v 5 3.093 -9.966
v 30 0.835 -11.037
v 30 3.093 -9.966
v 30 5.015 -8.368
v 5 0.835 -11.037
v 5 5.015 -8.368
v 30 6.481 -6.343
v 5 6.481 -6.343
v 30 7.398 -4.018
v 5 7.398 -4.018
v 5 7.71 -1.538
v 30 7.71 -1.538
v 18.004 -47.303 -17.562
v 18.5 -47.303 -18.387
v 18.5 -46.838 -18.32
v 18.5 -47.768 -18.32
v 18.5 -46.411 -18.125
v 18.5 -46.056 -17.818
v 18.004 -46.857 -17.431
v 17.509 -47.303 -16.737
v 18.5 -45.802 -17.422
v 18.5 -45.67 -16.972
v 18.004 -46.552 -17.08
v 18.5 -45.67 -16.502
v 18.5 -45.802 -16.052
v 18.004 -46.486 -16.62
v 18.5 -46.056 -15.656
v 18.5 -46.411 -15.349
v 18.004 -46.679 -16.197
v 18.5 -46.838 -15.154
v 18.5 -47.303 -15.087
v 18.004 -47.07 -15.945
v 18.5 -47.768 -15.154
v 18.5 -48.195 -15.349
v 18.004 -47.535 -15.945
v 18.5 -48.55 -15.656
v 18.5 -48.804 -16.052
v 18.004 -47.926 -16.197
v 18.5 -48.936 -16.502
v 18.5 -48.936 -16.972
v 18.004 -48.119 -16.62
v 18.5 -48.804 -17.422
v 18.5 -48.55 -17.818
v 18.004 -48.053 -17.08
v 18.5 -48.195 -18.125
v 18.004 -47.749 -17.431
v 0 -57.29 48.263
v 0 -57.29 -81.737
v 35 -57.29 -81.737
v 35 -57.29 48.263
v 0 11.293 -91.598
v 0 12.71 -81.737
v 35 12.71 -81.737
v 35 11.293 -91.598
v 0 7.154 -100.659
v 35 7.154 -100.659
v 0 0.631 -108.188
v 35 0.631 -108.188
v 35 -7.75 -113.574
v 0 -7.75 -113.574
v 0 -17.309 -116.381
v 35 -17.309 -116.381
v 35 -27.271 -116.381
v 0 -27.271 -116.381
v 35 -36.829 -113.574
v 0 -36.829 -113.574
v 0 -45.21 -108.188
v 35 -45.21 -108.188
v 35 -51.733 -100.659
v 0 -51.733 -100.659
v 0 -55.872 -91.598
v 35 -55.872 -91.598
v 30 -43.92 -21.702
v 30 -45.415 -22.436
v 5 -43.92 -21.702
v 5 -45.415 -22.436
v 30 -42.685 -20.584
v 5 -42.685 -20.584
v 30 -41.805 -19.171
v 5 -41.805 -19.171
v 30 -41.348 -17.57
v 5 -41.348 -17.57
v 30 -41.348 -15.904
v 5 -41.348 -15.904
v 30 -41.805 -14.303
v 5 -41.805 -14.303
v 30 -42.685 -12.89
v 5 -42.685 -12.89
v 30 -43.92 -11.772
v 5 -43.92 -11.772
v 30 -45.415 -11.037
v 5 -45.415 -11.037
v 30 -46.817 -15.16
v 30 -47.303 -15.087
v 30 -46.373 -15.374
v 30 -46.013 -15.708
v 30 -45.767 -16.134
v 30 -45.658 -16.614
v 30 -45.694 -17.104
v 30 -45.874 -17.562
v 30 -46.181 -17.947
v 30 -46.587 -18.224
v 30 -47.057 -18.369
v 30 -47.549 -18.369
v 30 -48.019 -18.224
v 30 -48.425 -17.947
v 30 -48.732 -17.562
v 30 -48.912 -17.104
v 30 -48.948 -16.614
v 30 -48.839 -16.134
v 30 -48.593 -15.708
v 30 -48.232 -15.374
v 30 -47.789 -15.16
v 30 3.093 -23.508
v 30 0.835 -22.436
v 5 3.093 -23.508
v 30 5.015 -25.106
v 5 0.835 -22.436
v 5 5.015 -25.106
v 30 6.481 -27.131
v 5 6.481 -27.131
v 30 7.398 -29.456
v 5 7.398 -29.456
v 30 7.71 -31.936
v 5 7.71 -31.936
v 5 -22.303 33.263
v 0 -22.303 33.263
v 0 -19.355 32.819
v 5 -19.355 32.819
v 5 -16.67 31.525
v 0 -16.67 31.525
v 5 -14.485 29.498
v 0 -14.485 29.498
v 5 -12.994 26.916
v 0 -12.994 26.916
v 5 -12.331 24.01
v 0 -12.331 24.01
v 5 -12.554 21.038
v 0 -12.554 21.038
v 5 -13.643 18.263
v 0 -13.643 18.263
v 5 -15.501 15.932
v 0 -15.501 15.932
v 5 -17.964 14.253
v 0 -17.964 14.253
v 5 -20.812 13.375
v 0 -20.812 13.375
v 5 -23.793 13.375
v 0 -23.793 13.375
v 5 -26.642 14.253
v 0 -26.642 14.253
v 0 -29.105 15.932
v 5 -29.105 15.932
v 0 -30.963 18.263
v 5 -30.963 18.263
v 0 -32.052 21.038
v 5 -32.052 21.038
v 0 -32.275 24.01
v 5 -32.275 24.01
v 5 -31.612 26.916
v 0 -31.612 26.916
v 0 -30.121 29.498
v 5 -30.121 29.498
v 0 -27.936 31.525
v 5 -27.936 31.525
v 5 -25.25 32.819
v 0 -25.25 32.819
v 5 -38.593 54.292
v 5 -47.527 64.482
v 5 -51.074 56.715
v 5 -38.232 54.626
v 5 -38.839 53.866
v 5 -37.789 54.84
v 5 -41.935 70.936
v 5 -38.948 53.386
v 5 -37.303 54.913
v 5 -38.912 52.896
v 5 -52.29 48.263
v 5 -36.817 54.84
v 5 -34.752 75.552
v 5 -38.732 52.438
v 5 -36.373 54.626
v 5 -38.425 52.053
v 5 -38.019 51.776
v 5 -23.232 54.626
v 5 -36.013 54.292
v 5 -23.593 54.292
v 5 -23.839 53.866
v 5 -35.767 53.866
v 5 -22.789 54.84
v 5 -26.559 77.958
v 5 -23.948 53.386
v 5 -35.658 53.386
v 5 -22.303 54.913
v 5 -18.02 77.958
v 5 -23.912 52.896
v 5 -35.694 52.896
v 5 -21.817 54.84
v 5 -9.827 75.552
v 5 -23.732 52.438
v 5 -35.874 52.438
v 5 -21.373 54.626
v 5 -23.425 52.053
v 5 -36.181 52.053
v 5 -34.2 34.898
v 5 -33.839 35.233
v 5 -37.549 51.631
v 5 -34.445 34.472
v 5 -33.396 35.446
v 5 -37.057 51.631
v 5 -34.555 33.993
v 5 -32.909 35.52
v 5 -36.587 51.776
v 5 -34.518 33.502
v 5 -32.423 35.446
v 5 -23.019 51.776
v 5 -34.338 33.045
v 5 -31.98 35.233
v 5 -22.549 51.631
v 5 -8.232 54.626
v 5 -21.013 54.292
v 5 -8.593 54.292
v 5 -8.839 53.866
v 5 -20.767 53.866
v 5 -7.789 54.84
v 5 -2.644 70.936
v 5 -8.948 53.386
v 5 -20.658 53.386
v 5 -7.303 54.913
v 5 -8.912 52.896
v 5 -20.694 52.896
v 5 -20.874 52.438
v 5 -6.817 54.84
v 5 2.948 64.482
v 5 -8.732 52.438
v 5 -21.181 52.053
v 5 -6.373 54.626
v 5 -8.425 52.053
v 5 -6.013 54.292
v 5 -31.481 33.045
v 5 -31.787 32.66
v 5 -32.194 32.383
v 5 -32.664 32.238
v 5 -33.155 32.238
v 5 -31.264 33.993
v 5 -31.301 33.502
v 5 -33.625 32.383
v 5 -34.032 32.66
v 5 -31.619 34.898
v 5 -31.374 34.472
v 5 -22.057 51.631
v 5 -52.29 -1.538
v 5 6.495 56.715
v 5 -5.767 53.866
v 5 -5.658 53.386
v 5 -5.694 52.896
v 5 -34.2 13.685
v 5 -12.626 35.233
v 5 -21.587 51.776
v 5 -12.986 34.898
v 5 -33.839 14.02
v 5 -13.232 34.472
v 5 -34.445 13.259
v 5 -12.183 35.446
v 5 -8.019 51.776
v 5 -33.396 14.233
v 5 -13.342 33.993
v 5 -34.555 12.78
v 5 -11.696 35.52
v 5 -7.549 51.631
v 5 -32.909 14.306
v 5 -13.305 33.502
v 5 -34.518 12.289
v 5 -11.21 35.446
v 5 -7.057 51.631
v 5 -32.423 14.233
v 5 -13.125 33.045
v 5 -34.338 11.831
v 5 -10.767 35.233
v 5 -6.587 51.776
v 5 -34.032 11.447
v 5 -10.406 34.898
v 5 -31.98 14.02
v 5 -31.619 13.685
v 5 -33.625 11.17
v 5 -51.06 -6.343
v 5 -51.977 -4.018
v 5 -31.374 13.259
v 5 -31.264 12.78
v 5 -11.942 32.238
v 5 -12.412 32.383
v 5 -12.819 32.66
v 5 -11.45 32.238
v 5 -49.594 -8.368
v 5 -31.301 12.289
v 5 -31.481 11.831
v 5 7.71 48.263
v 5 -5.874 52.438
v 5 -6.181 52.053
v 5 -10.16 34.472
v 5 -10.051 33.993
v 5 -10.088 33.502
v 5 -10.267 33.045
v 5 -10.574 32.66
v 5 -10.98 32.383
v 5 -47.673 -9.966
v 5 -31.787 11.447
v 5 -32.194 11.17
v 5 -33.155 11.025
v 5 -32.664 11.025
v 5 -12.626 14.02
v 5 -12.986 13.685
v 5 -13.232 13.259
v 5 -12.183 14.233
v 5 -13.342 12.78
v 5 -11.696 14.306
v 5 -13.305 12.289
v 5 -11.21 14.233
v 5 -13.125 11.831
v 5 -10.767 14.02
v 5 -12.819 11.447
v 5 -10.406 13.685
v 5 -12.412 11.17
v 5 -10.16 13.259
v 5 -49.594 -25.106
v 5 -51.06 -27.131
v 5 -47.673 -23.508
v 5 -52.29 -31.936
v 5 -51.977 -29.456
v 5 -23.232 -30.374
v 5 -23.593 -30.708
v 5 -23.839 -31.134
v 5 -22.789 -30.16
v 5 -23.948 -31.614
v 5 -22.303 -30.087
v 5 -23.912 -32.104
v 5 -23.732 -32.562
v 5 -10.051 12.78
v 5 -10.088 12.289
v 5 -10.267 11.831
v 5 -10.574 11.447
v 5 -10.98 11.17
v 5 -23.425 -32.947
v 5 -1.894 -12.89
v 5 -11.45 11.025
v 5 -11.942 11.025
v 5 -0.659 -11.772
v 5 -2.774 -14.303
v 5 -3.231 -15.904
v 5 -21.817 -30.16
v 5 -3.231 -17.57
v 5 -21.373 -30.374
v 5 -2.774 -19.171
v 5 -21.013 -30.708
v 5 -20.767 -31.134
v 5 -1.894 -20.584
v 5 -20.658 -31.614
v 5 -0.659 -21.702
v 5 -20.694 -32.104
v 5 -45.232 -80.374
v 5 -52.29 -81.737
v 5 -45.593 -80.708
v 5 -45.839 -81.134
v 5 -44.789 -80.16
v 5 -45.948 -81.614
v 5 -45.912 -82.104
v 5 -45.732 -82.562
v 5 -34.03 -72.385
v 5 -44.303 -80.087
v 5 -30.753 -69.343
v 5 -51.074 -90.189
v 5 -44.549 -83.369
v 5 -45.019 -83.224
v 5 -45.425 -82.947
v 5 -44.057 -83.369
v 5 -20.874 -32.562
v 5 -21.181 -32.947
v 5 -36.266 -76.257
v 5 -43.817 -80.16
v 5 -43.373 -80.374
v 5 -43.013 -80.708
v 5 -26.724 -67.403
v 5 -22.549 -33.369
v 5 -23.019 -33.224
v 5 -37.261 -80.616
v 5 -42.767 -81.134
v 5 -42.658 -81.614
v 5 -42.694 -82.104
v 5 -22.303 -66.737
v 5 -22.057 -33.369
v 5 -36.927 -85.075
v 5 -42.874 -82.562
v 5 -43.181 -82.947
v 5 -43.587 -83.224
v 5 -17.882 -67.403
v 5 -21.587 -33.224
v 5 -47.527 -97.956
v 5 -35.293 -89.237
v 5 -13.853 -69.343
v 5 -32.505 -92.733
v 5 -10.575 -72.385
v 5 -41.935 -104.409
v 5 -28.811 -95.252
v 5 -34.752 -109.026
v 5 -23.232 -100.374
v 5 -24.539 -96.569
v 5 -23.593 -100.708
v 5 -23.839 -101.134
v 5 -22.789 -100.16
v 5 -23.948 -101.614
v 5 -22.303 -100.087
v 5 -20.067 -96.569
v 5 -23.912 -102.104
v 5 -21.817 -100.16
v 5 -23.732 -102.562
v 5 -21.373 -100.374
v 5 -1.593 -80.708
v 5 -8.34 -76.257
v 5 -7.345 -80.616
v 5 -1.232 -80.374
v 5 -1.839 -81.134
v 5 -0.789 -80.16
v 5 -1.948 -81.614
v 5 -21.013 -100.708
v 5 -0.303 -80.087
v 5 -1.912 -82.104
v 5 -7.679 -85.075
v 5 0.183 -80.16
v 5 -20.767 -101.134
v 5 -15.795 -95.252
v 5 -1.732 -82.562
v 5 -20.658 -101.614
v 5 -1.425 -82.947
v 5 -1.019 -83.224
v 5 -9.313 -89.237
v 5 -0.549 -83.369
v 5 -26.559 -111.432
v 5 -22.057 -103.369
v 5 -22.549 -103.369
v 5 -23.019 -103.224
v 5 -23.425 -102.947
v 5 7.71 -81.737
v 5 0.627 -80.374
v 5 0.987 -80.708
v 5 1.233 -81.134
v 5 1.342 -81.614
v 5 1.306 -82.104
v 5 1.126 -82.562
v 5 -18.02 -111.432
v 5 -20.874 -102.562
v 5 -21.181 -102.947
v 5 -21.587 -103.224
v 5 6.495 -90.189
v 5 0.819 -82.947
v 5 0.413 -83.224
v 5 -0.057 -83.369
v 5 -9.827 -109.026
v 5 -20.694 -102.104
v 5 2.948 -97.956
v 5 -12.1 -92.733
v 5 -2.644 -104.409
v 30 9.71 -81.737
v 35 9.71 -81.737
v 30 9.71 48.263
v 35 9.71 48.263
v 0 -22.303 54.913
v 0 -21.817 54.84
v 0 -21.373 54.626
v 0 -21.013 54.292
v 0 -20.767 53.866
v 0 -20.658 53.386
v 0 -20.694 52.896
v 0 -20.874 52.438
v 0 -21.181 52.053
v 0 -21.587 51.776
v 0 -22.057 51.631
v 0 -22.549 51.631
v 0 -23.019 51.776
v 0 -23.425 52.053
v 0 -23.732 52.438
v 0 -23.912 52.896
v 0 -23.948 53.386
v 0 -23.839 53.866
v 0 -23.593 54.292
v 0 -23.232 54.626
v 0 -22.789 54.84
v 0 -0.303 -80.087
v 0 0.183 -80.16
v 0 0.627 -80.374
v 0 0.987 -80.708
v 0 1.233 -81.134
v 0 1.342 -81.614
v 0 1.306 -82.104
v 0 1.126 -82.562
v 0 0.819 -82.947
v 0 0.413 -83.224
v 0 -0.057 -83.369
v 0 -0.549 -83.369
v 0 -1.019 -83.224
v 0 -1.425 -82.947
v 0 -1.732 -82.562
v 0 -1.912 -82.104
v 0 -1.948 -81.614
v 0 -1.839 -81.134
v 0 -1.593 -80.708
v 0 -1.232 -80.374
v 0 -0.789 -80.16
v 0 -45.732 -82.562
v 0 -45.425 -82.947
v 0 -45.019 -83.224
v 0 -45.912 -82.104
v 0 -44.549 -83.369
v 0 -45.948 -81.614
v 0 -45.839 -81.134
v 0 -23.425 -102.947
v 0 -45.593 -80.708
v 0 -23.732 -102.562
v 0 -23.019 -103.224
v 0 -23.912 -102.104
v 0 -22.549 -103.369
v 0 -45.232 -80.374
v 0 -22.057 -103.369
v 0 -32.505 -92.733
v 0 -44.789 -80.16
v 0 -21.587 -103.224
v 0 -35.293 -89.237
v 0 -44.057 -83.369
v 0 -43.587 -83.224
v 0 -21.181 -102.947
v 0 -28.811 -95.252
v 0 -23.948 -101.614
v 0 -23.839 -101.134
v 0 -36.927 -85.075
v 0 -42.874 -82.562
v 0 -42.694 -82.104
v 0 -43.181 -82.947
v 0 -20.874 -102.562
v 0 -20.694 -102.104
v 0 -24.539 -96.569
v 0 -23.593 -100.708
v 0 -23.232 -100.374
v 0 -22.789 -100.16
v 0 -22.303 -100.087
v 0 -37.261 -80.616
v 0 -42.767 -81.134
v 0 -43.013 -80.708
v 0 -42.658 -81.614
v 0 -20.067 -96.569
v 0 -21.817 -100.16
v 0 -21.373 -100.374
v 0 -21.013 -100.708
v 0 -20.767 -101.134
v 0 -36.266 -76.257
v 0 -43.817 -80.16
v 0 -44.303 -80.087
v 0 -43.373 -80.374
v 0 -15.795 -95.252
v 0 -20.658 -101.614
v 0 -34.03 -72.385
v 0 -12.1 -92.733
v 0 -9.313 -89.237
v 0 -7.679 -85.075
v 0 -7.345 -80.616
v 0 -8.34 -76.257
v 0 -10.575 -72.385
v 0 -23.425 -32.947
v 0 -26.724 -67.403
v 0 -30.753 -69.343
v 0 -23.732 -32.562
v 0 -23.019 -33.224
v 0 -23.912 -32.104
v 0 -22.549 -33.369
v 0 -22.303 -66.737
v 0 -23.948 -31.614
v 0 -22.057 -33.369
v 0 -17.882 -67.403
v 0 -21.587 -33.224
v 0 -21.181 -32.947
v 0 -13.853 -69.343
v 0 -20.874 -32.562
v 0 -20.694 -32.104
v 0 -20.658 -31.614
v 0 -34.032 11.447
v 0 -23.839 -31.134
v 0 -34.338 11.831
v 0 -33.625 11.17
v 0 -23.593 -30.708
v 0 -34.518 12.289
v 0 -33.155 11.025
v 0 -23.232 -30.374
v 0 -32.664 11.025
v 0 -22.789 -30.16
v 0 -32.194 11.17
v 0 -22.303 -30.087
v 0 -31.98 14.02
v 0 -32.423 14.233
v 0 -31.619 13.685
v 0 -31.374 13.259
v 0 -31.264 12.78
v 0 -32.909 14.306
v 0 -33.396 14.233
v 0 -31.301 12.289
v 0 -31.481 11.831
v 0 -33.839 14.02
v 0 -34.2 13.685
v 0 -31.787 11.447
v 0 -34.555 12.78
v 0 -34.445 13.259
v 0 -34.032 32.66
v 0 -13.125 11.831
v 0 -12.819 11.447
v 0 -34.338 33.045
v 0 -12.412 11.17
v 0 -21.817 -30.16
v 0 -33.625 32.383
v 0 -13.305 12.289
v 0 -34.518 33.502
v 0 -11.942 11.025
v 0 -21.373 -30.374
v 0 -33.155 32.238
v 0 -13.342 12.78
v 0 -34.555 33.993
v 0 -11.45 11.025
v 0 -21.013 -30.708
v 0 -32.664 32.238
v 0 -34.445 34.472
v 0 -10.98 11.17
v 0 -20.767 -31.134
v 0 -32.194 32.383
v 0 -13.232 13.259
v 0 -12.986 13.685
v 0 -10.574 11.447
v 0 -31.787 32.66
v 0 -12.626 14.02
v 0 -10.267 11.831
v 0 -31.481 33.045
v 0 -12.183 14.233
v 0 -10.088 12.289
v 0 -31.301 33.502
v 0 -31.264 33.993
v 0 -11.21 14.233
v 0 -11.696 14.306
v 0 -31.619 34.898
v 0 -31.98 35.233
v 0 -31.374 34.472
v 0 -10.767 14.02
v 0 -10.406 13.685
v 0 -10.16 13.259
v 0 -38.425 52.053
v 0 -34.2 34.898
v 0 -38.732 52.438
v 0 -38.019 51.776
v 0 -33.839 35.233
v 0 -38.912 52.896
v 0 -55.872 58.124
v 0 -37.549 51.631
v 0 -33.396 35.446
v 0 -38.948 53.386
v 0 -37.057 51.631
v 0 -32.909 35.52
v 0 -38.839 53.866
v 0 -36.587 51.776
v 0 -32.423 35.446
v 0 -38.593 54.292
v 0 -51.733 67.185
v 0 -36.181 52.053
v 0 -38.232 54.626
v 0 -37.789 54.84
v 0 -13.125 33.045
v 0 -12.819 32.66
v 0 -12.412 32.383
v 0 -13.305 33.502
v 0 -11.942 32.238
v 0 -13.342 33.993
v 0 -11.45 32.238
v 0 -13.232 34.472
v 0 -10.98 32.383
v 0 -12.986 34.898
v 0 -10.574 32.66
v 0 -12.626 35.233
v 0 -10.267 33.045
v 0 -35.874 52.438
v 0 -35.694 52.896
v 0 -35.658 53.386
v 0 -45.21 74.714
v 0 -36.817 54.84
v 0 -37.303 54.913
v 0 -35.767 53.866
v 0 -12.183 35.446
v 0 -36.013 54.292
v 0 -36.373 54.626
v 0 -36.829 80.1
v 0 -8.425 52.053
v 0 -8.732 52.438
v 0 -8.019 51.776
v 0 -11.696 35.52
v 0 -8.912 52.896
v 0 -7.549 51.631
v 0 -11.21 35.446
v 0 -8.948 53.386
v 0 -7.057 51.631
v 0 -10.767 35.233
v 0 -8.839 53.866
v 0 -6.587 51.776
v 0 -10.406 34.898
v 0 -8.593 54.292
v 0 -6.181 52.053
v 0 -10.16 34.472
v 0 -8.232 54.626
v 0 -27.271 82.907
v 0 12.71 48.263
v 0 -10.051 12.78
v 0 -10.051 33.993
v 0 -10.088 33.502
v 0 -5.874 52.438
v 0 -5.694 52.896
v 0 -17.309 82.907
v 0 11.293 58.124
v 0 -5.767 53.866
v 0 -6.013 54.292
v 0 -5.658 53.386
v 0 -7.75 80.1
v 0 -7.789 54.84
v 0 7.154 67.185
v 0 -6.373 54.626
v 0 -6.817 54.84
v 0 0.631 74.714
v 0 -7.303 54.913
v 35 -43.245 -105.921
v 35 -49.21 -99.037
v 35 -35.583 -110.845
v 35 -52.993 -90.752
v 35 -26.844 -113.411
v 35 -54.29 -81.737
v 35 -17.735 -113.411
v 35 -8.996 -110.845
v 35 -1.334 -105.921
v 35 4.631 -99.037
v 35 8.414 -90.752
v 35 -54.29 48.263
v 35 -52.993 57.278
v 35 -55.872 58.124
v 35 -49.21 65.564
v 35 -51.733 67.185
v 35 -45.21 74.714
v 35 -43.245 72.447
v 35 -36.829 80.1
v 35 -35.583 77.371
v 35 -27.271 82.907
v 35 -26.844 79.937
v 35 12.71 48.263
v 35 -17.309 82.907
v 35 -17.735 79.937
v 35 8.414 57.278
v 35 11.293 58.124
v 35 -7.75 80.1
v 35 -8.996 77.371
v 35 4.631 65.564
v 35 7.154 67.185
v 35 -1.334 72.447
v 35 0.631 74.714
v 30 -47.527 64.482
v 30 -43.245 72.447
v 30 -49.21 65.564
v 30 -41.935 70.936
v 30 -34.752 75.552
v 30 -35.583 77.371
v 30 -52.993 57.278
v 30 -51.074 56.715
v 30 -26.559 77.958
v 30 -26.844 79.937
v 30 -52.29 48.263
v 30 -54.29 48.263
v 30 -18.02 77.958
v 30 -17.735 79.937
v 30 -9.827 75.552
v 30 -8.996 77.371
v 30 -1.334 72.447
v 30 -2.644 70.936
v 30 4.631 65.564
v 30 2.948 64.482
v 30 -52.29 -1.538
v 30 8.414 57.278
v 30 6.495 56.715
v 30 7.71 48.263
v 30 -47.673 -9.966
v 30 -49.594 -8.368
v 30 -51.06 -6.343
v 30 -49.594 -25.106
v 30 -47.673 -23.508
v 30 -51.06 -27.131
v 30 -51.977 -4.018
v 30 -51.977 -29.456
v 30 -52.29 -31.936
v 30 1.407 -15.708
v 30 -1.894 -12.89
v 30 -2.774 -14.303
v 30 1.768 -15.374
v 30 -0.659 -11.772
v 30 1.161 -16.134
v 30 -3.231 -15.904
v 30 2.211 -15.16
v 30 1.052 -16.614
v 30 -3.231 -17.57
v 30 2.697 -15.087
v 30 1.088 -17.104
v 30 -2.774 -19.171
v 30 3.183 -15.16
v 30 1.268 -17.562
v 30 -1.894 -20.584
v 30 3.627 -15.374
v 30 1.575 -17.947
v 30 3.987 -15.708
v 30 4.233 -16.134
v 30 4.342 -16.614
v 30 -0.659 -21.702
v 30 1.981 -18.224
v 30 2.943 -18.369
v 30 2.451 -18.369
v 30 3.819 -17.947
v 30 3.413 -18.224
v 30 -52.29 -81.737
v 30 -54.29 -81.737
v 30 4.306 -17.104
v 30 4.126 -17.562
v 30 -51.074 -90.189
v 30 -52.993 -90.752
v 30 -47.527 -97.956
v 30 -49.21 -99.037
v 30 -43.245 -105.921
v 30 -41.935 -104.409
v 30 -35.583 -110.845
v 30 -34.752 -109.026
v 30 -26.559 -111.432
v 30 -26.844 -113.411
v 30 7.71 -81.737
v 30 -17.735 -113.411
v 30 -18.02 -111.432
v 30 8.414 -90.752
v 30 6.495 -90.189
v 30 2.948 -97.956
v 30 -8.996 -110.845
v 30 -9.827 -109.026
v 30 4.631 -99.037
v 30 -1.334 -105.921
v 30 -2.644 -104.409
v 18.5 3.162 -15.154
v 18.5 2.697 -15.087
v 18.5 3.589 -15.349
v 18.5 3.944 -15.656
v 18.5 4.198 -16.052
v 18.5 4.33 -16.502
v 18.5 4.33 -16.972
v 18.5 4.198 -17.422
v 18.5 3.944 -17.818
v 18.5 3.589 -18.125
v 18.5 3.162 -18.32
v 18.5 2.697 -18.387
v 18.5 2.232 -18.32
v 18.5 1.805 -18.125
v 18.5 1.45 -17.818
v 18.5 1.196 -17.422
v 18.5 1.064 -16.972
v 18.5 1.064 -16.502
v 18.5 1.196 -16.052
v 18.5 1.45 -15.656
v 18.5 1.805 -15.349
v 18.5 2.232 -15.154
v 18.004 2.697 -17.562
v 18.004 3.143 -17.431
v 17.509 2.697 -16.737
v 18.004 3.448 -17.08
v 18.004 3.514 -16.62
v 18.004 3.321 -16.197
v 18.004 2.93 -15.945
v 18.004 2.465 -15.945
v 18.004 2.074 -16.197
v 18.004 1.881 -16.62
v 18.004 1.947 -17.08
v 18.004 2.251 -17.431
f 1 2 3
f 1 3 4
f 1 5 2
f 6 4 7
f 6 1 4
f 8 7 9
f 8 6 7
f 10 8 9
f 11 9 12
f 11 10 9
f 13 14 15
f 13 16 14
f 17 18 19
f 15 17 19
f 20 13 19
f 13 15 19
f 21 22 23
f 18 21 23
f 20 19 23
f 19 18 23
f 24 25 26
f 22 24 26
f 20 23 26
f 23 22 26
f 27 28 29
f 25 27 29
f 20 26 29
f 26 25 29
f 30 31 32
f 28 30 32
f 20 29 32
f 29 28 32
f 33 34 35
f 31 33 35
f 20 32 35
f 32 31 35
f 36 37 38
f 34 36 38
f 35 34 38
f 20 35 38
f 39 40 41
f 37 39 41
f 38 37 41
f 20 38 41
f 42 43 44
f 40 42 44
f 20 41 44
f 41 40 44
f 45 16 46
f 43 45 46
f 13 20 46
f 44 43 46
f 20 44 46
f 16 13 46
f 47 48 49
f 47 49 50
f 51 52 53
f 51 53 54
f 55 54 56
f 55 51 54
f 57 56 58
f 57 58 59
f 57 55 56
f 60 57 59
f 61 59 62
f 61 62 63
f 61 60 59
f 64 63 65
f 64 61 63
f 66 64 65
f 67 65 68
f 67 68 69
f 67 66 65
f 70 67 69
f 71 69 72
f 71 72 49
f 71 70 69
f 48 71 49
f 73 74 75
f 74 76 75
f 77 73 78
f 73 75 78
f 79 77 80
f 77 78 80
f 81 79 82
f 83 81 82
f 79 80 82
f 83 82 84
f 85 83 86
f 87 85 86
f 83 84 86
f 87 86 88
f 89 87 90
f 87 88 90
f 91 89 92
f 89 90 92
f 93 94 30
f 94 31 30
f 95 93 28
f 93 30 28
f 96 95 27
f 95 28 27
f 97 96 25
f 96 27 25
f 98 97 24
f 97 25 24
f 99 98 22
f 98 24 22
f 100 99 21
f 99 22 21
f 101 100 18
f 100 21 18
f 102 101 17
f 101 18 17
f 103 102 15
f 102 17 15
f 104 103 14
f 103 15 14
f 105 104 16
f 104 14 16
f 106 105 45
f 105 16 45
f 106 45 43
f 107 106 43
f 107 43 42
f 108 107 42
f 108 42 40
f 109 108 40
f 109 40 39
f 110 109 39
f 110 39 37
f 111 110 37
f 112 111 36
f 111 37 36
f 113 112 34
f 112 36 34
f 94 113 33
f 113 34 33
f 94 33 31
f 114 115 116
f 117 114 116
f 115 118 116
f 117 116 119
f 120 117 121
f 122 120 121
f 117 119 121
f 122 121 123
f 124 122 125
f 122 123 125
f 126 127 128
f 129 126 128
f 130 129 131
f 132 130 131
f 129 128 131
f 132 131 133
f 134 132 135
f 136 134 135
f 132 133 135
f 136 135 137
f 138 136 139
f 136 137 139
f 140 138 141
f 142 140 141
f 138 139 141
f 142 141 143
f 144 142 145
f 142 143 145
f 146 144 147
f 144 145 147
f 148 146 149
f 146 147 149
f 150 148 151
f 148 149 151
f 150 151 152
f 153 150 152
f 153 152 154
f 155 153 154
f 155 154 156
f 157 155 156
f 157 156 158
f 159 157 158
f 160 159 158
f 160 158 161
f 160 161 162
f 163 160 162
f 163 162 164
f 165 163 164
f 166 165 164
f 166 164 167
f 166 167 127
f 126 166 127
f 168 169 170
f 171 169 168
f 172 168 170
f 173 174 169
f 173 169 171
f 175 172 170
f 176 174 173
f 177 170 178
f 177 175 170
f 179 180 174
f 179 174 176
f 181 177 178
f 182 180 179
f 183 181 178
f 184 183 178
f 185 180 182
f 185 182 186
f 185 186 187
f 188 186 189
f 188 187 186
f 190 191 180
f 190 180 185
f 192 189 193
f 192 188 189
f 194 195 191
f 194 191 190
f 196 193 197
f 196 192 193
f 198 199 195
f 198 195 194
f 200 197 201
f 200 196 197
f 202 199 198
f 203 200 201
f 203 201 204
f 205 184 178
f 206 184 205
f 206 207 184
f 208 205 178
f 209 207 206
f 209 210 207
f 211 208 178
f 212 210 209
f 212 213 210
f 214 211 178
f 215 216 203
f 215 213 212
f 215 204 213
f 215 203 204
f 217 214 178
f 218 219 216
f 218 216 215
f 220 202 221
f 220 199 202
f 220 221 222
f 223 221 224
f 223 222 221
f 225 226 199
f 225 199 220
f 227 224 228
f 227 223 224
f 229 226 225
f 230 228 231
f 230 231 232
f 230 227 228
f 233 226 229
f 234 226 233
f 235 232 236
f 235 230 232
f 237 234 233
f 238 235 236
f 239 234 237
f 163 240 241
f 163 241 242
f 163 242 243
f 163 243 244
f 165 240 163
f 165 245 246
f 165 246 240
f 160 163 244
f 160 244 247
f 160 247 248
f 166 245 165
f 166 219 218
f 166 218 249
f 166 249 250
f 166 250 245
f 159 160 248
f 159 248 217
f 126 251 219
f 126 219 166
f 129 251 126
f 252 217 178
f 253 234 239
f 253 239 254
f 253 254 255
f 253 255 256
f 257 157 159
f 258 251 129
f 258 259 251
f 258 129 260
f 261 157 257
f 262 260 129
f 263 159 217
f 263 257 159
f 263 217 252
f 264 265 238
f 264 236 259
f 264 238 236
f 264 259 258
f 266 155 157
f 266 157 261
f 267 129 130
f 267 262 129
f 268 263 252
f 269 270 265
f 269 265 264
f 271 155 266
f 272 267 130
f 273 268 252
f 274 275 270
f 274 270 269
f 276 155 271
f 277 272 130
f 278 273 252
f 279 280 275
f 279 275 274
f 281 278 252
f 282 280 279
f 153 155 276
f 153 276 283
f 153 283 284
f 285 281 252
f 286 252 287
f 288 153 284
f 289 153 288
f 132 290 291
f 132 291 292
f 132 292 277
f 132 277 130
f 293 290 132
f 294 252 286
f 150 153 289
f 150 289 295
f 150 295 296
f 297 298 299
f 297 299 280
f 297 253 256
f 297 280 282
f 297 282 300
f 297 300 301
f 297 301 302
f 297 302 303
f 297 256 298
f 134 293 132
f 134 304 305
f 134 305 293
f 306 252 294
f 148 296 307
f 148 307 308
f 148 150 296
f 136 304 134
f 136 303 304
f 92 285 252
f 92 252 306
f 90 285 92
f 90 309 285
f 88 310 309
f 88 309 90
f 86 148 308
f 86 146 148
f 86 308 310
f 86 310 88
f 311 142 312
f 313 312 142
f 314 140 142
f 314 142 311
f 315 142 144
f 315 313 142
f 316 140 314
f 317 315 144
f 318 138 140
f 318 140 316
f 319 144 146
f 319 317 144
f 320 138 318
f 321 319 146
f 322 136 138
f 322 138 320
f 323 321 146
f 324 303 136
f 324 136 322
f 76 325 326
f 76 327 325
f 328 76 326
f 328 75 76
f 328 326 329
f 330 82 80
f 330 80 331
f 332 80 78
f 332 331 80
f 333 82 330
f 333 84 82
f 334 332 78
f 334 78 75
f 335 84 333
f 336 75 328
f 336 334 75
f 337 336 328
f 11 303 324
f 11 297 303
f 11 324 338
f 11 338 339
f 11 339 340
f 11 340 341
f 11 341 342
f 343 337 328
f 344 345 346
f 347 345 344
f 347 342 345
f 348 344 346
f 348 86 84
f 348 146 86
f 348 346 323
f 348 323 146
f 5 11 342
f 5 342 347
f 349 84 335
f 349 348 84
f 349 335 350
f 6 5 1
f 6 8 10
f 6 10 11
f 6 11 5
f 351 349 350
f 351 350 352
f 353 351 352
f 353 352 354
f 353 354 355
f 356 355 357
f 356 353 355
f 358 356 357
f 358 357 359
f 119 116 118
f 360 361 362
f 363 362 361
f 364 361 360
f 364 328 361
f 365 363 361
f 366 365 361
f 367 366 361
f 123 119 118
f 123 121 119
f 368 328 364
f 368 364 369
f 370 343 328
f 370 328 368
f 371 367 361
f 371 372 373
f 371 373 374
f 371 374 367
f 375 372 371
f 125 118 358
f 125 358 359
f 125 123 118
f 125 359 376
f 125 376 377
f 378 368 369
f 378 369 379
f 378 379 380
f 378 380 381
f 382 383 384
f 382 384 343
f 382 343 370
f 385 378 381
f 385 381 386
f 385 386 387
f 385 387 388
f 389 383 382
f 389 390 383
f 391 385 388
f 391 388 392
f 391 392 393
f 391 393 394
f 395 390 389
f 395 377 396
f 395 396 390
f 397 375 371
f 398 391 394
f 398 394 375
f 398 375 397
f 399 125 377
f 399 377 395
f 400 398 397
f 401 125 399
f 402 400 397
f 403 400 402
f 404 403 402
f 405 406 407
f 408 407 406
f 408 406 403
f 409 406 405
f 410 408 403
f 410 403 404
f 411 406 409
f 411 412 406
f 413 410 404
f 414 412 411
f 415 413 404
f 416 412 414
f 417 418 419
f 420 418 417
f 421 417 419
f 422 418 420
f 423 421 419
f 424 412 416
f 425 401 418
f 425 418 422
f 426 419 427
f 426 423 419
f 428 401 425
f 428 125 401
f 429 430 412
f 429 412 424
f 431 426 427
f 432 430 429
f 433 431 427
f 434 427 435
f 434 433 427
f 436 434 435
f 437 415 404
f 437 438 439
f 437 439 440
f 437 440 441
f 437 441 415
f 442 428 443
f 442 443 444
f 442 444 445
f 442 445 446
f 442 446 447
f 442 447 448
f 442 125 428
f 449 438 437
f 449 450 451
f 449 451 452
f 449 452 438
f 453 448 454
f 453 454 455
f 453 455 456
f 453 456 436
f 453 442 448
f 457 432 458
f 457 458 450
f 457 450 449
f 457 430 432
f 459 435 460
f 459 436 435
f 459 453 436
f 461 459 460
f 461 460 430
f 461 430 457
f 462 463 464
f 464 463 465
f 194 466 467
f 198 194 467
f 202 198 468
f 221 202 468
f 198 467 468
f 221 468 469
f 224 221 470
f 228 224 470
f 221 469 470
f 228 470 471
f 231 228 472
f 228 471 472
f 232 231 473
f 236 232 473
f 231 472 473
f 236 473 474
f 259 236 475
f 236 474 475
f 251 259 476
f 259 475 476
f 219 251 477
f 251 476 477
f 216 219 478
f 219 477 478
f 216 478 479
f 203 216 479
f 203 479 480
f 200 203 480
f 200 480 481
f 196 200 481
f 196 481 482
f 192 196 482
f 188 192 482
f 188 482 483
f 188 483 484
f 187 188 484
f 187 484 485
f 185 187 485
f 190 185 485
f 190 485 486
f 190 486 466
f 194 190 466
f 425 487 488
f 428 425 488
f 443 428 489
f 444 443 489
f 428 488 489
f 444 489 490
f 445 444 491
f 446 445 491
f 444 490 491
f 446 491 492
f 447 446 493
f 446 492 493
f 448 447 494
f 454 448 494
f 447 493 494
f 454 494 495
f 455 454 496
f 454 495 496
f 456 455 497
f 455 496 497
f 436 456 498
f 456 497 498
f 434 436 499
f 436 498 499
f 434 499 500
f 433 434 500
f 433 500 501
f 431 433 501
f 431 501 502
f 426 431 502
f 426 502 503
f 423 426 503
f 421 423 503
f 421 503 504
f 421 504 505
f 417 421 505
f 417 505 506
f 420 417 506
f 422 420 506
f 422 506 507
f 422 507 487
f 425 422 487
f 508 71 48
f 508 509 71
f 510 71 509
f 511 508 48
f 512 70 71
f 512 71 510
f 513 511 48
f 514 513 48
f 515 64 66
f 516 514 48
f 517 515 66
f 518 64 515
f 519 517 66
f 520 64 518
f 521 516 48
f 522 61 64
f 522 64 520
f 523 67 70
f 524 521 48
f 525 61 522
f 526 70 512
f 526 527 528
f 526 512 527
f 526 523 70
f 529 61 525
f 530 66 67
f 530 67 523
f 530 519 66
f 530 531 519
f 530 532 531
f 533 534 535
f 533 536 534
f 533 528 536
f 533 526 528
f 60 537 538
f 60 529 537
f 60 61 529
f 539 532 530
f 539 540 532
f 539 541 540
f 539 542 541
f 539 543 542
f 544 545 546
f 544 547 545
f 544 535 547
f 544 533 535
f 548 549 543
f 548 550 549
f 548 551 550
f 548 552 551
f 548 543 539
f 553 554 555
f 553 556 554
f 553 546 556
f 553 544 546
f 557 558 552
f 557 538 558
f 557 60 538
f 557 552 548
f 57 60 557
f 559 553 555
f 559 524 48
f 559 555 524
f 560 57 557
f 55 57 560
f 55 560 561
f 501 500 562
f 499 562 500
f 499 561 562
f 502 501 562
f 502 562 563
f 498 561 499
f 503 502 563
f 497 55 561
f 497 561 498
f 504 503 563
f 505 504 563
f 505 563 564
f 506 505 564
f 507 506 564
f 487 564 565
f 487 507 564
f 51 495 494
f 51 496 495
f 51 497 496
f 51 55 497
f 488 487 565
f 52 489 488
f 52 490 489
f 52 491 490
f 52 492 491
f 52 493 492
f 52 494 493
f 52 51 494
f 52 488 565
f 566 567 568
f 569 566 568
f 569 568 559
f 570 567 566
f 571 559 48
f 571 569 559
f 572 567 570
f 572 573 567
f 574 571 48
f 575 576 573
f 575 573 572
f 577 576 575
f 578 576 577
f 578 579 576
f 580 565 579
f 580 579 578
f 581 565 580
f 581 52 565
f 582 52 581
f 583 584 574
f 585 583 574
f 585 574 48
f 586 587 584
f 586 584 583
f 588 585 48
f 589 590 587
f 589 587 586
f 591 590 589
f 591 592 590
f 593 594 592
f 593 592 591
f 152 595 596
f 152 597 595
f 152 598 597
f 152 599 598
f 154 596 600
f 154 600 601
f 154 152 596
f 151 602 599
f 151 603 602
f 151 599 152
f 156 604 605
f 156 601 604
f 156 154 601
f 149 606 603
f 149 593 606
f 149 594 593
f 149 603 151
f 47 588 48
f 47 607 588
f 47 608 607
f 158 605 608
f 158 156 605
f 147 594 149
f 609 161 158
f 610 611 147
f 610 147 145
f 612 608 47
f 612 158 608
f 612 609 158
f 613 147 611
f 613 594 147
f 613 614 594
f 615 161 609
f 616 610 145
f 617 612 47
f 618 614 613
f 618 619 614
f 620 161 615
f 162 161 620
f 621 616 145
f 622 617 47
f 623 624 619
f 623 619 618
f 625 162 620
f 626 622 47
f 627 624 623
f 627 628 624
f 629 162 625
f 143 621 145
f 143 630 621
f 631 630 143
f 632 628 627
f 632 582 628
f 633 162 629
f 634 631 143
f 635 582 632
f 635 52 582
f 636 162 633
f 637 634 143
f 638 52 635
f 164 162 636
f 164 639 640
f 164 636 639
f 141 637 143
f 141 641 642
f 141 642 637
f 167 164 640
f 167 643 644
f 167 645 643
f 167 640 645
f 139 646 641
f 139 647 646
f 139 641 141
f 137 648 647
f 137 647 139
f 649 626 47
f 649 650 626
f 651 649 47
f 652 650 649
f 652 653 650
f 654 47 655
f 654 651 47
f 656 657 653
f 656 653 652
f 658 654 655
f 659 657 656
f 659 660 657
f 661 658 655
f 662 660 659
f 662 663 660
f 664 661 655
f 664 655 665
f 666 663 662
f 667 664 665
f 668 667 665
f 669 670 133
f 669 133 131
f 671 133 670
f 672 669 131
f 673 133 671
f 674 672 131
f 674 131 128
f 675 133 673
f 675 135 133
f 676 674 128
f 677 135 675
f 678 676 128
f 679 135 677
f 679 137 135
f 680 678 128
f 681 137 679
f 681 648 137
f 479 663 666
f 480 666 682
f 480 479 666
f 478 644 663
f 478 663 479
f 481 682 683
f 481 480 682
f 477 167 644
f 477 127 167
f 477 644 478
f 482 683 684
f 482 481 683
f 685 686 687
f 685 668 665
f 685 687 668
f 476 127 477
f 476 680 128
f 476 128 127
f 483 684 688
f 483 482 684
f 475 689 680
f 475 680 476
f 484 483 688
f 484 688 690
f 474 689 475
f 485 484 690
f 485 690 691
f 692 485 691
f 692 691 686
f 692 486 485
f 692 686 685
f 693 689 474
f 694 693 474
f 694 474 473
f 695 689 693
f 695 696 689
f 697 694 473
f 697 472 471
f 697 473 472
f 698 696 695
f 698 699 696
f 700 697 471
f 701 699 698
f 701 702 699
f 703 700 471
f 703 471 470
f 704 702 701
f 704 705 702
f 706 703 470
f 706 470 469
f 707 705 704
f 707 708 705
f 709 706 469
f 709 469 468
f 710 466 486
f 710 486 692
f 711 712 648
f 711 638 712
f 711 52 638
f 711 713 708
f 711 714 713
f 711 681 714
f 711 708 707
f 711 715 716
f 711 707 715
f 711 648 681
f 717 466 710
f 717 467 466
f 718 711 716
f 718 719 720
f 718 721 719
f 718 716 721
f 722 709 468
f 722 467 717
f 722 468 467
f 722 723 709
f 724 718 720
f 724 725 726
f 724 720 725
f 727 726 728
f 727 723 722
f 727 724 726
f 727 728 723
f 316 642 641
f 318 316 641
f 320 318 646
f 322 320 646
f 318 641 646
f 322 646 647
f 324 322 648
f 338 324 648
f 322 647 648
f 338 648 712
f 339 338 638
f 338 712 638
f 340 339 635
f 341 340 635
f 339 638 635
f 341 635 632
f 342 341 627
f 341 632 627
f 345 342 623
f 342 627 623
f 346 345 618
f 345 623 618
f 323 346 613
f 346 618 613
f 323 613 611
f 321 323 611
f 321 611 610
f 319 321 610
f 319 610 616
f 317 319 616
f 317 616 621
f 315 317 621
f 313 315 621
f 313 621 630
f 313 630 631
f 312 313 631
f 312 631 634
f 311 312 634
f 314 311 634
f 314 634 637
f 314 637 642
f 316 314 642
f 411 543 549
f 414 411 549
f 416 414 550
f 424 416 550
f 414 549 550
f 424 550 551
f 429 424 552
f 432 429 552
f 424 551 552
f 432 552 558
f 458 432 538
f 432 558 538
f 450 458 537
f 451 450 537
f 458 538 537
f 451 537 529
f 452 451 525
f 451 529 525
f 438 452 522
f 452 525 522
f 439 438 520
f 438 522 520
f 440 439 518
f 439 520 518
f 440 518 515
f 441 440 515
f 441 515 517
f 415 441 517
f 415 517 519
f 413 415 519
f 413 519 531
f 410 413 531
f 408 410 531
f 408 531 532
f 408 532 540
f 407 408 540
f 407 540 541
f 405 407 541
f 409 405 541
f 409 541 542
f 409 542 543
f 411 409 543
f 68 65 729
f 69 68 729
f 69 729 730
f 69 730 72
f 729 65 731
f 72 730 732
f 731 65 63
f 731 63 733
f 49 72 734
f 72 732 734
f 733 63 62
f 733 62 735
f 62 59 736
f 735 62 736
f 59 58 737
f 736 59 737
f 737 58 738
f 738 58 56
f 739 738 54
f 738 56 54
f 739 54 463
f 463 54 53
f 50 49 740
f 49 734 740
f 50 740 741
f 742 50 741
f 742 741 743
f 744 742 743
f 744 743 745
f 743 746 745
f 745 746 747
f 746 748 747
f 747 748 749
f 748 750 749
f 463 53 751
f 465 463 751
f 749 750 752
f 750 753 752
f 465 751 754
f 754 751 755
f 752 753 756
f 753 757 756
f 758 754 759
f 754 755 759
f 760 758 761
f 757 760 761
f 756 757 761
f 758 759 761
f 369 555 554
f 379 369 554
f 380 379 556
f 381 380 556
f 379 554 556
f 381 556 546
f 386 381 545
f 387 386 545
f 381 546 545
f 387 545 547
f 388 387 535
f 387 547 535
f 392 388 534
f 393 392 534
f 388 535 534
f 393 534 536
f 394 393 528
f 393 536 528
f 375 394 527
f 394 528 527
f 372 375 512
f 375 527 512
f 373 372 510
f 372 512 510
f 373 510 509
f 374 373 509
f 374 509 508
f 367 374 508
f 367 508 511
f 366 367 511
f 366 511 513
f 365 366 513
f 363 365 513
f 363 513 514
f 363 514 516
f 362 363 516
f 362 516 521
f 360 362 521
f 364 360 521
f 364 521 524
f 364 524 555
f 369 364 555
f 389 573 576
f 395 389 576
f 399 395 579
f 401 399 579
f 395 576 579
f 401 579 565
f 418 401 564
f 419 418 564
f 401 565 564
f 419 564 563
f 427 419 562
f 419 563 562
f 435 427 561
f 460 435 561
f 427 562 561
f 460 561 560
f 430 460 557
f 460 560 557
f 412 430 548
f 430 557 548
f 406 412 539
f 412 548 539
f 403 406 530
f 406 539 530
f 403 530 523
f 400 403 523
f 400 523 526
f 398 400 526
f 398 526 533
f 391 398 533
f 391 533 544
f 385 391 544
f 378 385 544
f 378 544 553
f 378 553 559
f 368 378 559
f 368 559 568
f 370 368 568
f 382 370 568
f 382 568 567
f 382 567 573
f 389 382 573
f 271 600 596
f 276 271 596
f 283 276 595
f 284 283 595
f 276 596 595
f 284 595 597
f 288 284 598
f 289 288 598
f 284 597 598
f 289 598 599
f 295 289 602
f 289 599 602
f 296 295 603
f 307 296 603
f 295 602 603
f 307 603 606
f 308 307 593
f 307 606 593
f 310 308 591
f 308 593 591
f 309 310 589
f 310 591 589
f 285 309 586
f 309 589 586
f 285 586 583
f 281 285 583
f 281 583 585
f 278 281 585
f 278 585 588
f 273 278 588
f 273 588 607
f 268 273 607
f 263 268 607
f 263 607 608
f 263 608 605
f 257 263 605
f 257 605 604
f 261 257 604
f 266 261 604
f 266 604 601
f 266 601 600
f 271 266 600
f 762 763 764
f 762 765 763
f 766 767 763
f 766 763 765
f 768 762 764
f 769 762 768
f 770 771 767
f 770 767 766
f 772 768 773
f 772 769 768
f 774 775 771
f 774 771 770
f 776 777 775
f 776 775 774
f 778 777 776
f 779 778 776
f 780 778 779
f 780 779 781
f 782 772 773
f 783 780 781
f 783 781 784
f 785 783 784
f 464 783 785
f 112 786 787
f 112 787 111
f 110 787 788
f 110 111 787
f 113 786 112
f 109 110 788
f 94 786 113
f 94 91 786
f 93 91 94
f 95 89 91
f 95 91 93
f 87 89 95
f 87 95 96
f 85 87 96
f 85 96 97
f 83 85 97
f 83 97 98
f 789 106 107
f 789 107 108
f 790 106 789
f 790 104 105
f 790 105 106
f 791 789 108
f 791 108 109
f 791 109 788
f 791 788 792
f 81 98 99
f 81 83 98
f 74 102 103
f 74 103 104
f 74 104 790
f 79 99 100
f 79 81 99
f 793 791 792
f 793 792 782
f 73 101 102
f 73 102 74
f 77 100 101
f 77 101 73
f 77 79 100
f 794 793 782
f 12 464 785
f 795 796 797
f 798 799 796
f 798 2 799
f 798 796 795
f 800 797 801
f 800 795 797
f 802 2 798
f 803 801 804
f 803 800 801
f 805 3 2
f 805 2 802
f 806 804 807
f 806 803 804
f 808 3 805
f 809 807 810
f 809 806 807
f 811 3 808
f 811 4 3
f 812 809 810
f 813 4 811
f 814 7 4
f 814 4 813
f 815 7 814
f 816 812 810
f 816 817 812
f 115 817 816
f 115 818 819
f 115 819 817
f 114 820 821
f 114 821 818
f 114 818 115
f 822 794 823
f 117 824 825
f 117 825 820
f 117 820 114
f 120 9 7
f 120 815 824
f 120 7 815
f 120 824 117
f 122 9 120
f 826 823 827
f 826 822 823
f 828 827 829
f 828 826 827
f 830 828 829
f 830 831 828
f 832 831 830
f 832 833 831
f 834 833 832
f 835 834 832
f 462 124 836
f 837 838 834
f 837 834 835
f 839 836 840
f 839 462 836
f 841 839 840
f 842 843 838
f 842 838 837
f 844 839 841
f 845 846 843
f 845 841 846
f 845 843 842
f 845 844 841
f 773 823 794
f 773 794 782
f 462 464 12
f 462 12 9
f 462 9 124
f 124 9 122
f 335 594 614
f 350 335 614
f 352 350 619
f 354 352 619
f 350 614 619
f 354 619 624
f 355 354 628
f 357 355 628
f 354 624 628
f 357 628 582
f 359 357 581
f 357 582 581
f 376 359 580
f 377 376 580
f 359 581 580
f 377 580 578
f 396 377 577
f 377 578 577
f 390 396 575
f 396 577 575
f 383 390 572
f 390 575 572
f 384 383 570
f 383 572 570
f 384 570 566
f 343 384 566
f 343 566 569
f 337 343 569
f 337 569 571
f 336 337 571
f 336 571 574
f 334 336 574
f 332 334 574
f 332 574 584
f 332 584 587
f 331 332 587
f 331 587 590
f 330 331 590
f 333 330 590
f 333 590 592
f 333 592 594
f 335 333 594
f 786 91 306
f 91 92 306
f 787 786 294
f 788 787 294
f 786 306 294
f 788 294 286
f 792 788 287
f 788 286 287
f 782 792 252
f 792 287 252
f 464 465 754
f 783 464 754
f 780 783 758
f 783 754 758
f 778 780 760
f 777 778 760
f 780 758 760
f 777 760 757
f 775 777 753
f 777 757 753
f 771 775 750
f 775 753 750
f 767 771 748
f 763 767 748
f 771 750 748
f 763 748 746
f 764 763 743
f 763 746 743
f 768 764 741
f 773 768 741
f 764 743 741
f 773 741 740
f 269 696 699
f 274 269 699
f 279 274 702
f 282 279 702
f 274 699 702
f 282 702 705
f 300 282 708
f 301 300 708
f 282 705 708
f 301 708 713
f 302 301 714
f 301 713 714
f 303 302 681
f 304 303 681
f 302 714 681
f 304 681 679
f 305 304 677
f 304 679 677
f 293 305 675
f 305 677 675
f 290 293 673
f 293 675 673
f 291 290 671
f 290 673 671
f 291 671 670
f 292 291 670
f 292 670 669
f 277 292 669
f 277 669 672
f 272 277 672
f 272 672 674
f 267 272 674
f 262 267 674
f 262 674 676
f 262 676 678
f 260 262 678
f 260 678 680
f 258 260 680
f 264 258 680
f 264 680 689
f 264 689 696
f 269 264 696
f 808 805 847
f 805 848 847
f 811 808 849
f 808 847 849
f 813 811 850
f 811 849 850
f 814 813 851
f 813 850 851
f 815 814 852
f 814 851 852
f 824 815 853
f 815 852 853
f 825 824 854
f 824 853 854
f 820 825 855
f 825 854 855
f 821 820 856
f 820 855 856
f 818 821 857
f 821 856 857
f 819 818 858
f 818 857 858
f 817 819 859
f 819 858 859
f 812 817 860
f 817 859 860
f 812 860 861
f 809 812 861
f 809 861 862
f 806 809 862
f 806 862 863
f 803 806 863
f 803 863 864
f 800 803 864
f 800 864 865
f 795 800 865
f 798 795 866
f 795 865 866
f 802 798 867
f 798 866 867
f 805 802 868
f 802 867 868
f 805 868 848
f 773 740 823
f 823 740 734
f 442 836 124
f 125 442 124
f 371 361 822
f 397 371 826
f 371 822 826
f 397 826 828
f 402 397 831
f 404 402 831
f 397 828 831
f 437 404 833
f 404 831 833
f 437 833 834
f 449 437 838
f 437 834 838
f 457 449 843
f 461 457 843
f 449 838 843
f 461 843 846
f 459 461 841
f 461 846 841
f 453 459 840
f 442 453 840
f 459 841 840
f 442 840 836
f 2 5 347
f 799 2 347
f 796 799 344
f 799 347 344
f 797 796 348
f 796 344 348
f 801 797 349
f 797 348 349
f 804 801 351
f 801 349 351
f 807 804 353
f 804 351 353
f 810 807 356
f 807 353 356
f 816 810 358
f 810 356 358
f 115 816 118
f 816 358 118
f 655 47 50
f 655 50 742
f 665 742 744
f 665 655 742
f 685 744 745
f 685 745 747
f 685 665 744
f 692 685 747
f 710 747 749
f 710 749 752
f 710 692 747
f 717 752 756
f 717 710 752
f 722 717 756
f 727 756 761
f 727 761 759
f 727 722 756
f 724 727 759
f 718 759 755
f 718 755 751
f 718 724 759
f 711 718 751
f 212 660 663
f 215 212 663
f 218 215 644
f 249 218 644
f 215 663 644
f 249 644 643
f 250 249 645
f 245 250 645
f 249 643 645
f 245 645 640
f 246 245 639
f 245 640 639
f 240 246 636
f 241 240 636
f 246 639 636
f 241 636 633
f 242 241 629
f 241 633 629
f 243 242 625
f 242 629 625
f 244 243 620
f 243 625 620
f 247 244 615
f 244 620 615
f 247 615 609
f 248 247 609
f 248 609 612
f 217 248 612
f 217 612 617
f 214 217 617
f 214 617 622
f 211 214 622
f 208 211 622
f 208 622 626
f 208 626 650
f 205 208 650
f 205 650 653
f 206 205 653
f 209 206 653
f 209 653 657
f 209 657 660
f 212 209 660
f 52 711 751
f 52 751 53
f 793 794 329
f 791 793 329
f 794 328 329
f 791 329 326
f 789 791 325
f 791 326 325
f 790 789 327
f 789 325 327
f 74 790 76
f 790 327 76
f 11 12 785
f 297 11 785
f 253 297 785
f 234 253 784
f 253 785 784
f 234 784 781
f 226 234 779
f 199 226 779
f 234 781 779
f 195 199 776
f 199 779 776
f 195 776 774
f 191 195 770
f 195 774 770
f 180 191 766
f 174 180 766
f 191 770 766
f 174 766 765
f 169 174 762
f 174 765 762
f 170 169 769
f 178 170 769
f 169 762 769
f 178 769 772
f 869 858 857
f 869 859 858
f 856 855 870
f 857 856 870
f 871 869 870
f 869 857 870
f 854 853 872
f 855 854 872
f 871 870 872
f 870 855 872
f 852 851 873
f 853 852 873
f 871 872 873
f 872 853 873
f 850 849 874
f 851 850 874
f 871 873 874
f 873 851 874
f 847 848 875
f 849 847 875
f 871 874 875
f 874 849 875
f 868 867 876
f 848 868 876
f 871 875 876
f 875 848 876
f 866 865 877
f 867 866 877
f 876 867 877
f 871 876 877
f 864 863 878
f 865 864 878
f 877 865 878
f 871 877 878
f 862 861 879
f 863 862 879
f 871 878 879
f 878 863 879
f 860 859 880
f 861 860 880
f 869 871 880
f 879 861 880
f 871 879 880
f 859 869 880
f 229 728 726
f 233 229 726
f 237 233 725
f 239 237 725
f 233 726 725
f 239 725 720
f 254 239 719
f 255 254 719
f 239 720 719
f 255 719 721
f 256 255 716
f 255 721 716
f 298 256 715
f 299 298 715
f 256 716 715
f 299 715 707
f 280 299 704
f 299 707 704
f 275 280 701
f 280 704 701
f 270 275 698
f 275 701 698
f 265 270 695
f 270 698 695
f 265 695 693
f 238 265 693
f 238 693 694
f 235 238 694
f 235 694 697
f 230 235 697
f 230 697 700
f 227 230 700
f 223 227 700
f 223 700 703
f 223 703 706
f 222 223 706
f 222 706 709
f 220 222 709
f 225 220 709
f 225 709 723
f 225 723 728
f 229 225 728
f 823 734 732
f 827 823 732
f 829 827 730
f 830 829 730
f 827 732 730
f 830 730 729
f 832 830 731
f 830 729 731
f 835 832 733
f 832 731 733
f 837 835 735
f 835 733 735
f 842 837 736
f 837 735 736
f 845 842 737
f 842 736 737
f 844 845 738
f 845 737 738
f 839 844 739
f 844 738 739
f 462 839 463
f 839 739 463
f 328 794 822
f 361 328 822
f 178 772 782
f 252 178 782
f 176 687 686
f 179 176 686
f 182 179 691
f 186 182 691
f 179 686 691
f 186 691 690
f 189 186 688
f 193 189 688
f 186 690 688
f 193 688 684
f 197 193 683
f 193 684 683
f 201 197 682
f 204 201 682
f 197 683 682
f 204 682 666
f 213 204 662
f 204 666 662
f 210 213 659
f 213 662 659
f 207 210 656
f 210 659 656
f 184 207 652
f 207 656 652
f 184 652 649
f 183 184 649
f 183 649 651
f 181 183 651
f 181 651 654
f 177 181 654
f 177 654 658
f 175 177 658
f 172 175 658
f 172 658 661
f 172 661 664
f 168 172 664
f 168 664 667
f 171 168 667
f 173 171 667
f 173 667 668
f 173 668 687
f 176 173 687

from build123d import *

# Parameters (mm, degrees)
EXTRUDE_1_DEPTH          = 35
SKETCH_2_R               = 10
SKETCH_2_R_2             = 15
CUT_EXTRUDE_1_DEPTH      = 1
CUT_EXTRUDE_1_DEPTH_BACK = 36
CUT_EXTRUDE_2_DEPTH      = 30
CUT_EXTRUDE_3_DEPTH      = 5
SKETCH_10_R              = 6
EXTRUDE_2_DEPTH          = 25
FILLET_1_R               = 10
HOLE_WIZARD_M4_1_D       = 3.3
HOLE_WIZARD_M4_1_DEPTH   = 11.5
HOLE_WIZARD_M4_1_TIP     = 0.991420021
HOLE_WIZARD_M4_2_D       = 3.3


with BuildPart() as part:
    # 스케치1 → 보스-돌출1 (new body)
    with BuildSketch(Plane(origin=(0, 0, 0), x_dir=(0, 0, -1), z_dir=(1, 0, 0))):
        with BuildLine():
            Line((-48.263014716, 12.710470067), (81.736985284, 12.710470067))
            ThreePointArc((81.736985284, 12.710470067), (116.736985284, -22.289529933), (81.736985284, -57.289529933))
            Line((81.736985284, -57.289529933), (-48.263014716, -57.289529933))
            ThreePointArc((-48.263014716, -57.289529933), (-83.263014716, -22.289529933), (-48.263014716, 12.710470067))
        make_face()
    extrude(amount=EXTRUDE_1_DEPTH)

    # 스케치2 → 컷-돌출1 (cut, two sides)
    with BuildSketch(Plane.ZY) as cut_extrude_1_sk:
        with Locations((23.263014716, -22.302890454)):
            Circle(SKETCH_2_R)
        with Locations((-81.736985284, -22.302890454)):
            Circle(SKETCH_2_R_2)
    extrude(amount=CUT_EXTRUDE_1_DEPTH, mode=Mode.SUBTRACT)
    extrude(cut_extrude_1_sk.sketch, amount=-CUT_EXTRUDE_1_DEPTH_BACK, mode=Mode.SUBTRACT)

    # 스케치3 → 컷-돌출2 (cut)
    with BuildSketch(Plane(origin=(35, 0, 0), x_dir=(0, 0, -1), z_dir=(1, 0, 0))):
        with BuildLine():
            Line((81.736985284, 7.710470067), (-48.263014716, 7.710470067))
            ThreePointArc((-48.263014716, 7.710470067), (-78.263014716, -22.289529933), (-48.263014716, -52.289529933))
            Line((-48.263014716, -52.289529933), (81.736985284, -52.289529933))
            ThreePointArc((81.736985284, -52.289529933), (111.736985284, -22.289529933), (81.736985284, 7.710470067))
        make_face()
    extrude(amount=-CUT_EXTRUDE_2_DEPTH, mode=Mode.SUBTRACT)

    # 스케치5 → 컷-돌출3 (cut)
    with BuildSketch(Plane(origin=(35, 0, 0), x_dir=(0, 0, -1), z_dir=(1, 0, 0))):
        with BuildLine():
            Line((-48.263014716, -54.289529933), (81.736985284, -54.289529933))
            ThreePointArc((81.736985284, -54.289529933), (113.736985284, -22.289529933), (81.736985284, 9.710470067))
            Line((81.736985284, 9.710470067), (-48.263014716, 9.710470067))
            ThreePointArc((-48.263014716, 9.710470067), (-80.263014716, -22.289529933), (-48.263014716, -54.289529933))
        make_face()
        with BuildLine():
            Line((-48.263014716, -52.289529933), (81.736985284, -52.289529933))
            ThreePointArc((81.736985284, -52.289529933), (111.736985284, -22.289529933), (81.736985284, 7.710470067))
            Line((81.736985284, 7.710470067), (-48.263014716, 7.710470067))
            ThreePointArc((-48.263014716, 7.710470067), (-78.263014716, -22.289529933), (-48.263014716, -52.289529933))
        make_face(mode=Mode.SUBTRACT)
    extrude(amount=-CUT_EXTRUDE_3_DEPTH, mode=Mode.SUBTRACT)

    # 스케치10 → 보스-돌출2 (add)
    with BuildSketch(Plane(origin=(5, 0, 0), x_dir=(0, 0, -1), z_dir=(1, 0, 0))):
        with Locations((16.736985284, 2.710470067)):
            Circle(SKETCH_10_R)
        with Locations((16.736985284, -47.289529933)):
            Circle(SKETCH_10_R)
    extrude(amount=EXTRUDE_2_DEPTH)

    # 필렛1
    fillet_1_edges = [part.edges().sort_by_distance(p)[0] for p in [
        (17.5, 7.710470067, -20.053610075),
        (17.5, 7.710470067, -13.420360494),
        (17.5, -52.289529933, -13.420360494),
        (17.5, -52.289529933, -20.053610075),
    ]]
    fillet(fillet_1_edges, radius=FILLET_1_R)

    # M4 나사 구멍1
    with Locations(Plane(origin=(30, 0, 0), x_dir=(0, 0, -1), z_dir=(1, 0, 0))):
        with Locations((16.736985284, 2.697109546), (16.736985284, -47.302890454)):
            Hole(HOLE_WIZARD_M4_1_D / 2, depth=HOLE_WIZARD_M4_1_DEPTH)
            with Locations((0, 0, -(HOLE_WIZARD_M4_1_DEPTH + HOLE_WIZARD_M4_1_TIP / 2))):  # 118° drill point
                Cone(0, HOLE_WIZARD_M4_1_D / 2, HOLE_WIZARD_M4_1_TIP, mode=Mode.SUBTRACT)

    # M4 나사 구멍2 (through all)
    with Locations(Plane(origin=(5, 0, 0), x_dir=(0, 0, -1), z_dir=(1, 0, 0))):
        with Locations((-33.869616434, -11.696288736), (-12.656412998, -11.696288736), (-12.656412998, -32.909492171), (-33.869616434, -32.909492171), (-53.263014716, -37.302890454), (-53.263014716, -22.302890454), (-53.263014716, -7.302890454), (81.736985284, -0.302890454), (101.736985284, -22.302890454), (81.736985284, -44.302890454), (31.736985284, -22.302890454)):
            Hole(HOLE_WIZARD_M4_2_D / 2)


solid = part.part
